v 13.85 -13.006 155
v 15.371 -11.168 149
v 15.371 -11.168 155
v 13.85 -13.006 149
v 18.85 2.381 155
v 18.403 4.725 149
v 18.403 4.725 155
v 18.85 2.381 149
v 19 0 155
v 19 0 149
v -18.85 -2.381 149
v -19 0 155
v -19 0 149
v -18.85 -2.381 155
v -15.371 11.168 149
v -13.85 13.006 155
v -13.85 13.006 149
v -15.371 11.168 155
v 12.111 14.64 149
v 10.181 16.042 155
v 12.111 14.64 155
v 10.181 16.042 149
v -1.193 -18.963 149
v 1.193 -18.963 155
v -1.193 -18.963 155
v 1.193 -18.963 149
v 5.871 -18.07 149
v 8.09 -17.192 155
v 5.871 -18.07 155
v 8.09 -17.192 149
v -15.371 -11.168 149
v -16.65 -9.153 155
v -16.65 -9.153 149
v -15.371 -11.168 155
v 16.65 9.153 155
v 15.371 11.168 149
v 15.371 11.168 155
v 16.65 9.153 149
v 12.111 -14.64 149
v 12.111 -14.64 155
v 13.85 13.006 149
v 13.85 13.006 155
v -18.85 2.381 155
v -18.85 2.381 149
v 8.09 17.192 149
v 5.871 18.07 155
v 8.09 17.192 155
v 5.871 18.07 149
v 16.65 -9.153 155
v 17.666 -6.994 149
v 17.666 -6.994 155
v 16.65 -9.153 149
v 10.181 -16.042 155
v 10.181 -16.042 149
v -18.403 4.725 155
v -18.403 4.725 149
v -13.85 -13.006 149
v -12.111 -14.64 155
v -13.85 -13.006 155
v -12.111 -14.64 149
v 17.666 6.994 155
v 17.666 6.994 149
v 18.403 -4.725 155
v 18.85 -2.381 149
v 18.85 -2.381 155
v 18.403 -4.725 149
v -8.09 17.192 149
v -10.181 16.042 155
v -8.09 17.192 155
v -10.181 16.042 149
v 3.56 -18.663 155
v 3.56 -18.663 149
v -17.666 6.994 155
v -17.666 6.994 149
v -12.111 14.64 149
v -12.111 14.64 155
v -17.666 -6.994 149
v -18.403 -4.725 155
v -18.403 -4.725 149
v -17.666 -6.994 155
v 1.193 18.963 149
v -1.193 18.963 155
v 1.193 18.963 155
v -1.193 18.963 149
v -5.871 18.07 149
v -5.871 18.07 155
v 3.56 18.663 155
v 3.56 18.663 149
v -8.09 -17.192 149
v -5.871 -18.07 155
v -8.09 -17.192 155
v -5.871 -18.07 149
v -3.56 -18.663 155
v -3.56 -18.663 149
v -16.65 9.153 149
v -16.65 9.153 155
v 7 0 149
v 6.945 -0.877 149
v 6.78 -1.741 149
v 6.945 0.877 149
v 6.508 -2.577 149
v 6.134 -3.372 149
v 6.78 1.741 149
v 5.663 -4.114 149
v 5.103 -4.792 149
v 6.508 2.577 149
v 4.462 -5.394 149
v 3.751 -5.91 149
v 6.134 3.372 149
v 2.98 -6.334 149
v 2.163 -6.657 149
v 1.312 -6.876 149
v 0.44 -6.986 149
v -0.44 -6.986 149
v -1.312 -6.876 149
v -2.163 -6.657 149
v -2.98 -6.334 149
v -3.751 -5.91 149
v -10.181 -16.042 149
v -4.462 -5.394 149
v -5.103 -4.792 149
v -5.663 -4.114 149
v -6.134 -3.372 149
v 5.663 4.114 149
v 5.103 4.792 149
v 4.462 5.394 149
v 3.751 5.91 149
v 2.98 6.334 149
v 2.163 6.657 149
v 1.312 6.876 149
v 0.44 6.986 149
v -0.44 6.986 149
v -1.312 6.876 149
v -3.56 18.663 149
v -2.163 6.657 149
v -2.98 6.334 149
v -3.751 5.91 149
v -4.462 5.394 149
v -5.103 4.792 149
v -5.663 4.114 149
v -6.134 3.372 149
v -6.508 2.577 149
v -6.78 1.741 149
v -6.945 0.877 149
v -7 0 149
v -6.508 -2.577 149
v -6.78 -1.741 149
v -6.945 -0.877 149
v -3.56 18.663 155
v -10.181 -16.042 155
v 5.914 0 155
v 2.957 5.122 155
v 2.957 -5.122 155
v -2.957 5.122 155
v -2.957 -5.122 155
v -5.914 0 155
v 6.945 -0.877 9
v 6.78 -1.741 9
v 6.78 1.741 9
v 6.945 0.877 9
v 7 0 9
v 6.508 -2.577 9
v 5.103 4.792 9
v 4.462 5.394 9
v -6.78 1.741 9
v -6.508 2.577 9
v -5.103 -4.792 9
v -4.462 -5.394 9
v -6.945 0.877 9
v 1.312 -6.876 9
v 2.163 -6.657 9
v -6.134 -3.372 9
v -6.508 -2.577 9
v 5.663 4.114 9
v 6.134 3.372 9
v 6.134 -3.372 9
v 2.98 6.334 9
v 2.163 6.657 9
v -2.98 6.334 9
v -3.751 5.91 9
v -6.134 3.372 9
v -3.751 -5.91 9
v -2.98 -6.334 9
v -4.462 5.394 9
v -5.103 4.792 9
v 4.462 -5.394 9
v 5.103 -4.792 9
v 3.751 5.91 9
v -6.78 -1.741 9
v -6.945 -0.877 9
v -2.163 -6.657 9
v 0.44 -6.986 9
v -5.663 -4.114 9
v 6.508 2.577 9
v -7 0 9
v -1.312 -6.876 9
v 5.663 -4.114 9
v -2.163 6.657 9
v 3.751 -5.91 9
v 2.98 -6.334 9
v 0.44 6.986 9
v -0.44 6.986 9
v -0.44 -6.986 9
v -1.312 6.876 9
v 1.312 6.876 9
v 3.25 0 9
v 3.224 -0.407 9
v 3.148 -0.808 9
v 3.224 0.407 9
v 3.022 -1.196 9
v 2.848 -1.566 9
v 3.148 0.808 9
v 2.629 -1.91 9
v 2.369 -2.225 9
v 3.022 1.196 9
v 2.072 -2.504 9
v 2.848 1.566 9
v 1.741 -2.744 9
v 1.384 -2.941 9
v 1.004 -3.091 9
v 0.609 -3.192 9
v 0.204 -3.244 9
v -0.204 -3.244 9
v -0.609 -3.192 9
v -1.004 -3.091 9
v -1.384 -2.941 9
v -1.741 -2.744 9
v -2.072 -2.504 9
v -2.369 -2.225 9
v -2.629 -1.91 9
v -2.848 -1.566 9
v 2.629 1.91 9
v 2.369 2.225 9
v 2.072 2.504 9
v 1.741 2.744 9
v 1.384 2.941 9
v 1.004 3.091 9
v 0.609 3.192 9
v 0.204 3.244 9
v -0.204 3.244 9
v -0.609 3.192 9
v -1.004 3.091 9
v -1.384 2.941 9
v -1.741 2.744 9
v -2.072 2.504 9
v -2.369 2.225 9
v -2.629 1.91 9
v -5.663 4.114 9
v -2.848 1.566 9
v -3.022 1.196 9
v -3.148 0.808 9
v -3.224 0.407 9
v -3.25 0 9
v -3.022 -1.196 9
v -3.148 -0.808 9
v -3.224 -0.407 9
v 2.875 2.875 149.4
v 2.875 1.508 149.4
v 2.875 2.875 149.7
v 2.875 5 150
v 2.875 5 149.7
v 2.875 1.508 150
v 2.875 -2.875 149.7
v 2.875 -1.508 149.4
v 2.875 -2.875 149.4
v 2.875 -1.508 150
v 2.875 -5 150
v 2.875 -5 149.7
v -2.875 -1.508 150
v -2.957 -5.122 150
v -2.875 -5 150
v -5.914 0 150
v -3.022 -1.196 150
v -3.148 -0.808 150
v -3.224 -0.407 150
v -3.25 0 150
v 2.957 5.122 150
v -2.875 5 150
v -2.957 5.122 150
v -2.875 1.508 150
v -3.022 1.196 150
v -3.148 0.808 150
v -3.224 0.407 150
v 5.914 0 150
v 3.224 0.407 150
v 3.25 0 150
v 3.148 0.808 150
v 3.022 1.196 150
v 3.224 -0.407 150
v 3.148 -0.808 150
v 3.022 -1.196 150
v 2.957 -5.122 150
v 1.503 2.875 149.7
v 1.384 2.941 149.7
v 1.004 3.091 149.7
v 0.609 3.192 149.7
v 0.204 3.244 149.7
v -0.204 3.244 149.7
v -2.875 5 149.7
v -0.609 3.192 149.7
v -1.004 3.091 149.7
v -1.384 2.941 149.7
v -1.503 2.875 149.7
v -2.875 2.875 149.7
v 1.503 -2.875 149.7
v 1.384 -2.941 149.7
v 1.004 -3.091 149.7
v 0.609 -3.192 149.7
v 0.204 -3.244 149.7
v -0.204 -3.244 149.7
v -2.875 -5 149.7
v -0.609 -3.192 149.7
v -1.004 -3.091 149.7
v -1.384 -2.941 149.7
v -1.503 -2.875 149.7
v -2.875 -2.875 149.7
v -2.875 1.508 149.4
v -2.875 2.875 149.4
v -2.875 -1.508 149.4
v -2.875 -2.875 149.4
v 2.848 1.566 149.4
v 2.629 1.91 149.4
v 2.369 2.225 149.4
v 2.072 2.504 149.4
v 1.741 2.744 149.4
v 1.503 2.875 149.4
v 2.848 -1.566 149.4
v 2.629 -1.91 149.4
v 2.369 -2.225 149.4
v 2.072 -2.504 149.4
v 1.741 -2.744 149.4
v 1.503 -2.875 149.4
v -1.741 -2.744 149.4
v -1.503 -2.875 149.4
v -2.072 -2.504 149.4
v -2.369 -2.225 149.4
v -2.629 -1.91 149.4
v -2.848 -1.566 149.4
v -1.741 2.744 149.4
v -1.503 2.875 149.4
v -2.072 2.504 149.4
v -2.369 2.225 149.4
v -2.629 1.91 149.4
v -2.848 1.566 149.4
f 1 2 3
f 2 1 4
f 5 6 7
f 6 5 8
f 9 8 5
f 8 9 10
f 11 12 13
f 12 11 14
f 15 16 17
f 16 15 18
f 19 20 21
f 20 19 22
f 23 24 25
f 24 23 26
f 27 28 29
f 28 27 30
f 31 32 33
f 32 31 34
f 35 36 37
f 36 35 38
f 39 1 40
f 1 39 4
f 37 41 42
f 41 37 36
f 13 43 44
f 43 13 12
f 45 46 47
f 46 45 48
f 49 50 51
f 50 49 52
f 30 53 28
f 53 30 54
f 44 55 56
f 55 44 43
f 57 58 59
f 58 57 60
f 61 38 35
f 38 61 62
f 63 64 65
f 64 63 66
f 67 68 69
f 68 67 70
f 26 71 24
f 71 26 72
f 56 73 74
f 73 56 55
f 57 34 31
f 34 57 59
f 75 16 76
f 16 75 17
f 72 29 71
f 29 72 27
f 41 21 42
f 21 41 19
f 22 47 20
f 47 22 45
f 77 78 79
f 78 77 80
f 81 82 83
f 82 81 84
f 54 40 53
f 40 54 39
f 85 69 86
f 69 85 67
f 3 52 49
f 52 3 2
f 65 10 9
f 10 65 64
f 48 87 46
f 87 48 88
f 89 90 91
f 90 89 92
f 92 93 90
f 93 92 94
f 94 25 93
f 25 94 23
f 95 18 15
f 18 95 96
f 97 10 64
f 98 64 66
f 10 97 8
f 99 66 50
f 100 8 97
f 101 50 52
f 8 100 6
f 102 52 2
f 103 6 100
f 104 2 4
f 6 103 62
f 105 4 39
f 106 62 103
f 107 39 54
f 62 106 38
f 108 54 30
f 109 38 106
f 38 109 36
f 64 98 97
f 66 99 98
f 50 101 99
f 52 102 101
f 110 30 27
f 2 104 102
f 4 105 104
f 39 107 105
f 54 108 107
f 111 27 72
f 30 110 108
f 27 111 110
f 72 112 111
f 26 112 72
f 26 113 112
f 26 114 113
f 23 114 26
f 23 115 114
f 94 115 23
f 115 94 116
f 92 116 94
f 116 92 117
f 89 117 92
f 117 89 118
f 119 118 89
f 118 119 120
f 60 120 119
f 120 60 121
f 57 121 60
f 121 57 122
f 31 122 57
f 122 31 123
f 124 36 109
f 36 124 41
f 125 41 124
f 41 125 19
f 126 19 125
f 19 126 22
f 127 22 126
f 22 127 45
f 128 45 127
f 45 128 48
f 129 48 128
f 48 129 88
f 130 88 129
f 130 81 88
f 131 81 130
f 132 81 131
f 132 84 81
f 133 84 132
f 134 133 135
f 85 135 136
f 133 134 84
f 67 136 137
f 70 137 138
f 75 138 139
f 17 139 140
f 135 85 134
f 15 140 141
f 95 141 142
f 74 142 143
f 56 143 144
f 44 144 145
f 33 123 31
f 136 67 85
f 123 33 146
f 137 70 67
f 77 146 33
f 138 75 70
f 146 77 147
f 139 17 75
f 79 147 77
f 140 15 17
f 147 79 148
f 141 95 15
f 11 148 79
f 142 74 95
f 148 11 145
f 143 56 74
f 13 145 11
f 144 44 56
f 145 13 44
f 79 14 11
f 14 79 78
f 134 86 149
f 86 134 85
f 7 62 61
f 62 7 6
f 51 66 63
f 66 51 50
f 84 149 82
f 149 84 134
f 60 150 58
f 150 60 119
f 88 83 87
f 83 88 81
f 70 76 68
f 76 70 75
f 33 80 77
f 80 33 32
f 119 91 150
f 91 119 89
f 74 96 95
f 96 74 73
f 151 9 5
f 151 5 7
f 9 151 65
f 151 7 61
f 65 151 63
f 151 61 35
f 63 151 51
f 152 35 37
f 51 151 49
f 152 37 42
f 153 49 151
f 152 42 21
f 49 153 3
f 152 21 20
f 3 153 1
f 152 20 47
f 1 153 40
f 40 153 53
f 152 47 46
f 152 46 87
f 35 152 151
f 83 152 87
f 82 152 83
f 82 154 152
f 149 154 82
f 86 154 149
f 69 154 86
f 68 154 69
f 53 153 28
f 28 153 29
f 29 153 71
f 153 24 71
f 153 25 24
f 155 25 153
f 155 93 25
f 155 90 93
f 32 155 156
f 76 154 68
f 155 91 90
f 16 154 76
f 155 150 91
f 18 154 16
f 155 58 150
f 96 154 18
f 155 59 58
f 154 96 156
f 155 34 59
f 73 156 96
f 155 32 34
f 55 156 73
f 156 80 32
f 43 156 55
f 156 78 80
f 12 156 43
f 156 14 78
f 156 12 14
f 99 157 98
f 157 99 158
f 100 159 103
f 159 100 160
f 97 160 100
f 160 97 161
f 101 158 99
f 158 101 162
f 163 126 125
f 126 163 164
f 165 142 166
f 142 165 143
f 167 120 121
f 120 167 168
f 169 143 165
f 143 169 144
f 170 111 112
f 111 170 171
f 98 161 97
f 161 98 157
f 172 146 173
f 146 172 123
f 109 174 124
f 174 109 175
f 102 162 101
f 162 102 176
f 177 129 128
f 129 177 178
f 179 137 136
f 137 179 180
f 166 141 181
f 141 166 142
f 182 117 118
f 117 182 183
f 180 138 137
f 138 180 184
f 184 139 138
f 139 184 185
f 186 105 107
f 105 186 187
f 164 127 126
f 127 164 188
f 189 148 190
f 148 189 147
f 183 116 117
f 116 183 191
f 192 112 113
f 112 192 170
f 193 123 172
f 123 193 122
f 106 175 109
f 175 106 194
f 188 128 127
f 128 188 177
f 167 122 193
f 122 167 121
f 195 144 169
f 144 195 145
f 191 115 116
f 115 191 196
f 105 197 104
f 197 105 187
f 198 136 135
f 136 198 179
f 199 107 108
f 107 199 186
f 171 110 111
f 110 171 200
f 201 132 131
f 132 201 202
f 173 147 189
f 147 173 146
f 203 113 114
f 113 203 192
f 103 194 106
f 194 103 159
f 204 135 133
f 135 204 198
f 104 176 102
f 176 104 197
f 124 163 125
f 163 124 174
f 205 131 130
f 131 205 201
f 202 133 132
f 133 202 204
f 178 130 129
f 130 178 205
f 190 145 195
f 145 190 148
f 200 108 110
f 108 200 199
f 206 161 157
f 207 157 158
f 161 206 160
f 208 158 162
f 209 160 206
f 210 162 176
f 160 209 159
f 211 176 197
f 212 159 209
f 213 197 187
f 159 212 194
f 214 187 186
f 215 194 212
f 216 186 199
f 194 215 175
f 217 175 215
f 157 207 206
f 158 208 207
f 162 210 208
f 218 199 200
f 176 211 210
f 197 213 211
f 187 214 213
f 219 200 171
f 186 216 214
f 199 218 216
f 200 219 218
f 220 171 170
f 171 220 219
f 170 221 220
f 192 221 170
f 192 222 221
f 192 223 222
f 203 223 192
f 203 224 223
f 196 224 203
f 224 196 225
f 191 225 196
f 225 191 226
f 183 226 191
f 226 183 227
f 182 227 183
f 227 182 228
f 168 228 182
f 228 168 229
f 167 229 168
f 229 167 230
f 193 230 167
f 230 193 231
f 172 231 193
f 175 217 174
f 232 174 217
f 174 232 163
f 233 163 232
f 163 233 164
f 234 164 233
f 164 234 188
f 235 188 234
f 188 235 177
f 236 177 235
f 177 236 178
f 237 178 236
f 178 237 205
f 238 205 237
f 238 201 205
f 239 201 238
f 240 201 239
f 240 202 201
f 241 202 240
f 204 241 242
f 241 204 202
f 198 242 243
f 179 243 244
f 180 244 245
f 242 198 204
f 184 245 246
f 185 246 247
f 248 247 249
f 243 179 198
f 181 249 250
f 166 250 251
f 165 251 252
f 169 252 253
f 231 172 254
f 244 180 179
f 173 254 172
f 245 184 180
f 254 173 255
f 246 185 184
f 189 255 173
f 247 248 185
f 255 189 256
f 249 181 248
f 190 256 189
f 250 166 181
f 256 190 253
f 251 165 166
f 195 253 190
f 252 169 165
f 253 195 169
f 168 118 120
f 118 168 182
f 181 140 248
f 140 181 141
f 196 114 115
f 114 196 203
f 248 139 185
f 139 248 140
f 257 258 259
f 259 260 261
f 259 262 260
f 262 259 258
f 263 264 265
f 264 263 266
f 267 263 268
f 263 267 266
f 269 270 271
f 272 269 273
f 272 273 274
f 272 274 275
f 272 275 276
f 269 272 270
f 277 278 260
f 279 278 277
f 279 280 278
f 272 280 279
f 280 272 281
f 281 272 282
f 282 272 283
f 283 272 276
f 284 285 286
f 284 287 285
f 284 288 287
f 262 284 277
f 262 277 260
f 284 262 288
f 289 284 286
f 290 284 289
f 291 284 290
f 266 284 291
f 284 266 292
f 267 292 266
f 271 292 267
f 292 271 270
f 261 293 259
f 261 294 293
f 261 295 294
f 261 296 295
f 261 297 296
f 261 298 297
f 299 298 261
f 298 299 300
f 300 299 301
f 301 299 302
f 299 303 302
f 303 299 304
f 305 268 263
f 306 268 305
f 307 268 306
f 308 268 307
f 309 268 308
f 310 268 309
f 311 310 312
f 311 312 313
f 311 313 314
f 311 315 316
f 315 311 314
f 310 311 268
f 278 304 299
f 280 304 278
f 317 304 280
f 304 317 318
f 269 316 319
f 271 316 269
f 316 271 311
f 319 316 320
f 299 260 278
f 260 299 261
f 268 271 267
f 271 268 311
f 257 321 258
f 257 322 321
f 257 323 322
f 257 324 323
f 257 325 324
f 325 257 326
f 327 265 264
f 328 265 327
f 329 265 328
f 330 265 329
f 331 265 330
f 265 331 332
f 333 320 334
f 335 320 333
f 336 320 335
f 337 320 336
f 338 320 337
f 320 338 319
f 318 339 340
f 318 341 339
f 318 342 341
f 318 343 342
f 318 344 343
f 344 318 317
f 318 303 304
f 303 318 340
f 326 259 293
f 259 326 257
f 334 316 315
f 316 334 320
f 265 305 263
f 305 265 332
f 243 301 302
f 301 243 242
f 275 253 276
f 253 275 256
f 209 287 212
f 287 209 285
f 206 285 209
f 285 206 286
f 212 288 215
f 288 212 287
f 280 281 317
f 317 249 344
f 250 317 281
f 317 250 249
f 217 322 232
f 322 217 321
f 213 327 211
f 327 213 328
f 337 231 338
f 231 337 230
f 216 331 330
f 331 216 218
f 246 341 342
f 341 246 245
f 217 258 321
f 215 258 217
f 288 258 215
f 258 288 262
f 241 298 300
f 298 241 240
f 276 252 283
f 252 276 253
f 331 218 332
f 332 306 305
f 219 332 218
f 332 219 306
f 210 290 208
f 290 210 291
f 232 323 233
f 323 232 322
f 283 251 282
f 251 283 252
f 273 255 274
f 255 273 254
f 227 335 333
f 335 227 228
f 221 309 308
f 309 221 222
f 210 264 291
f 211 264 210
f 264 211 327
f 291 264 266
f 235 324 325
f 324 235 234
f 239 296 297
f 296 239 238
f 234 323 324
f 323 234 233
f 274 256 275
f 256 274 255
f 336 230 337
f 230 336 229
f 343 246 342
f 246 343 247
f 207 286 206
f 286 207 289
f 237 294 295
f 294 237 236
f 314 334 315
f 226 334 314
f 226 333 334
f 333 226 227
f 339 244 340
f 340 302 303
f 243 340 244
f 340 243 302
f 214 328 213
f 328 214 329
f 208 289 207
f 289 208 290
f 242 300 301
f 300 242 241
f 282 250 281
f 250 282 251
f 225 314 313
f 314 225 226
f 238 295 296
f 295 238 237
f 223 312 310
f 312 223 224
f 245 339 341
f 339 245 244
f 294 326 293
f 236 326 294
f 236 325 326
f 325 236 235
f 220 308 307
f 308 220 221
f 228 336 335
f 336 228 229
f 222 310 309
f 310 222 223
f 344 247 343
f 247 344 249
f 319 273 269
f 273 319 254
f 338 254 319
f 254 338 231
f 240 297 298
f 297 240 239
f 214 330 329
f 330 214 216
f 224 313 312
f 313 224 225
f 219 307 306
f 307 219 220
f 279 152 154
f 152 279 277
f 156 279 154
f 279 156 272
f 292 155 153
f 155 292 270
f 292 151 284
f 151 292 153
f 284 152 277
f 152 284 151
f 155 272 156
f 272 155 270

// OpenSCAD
$fn = 50;


difference() {
	union() {
		translate(v = [0, 0, 149.0000000000]) {
			cylinder(h = 6, r = 19.0000000000);
		}
		translate(v = [0, 0, 9.0000000000]) {
			cylinder(h = 146, r = 7.0000000000);
		}
	}
	union() {
		translate(v = [0, 0, 155]) {
			rotate(a = [0, 0, 0]) {
				difference() {
					union() {
						#translate(v = [-2.8750000000, -5.0000000000, -5.3000000000]) {
							cube(size = [5.7500000000, 10, 0.3000000000]);
						}
						#translate(v = [-2.8750000000, -2.8750000000, -5.6000000000]) {
							cube(size = [5.7500000000, 5.7500000000, 0.3000000000]);
						}
						#translate(v = [-2.8750000000, -5.0000000000, 0]) {
							cube(size = [5.7500000000, 10, 0.3000000000]);
						}
						#translate(v = [-2.8750000000, -2.8750000000, 0.3000000000]) {
							cube(size = [5.7500000000, 5.7500000000, 0.3000000000]);
						}
						#translate(v = [0, 0, -100.0000000000]) {
							cylinder(h = 200, r = 3.2500000000);
						}
						translate(v = [0, 0, -5]) {
							#linear_extrude(height = 5) {
								polygon(points = [[5.9142500000, 0.0000000000], [2.9571250000, 5.1218907443], [-2.9571250000, 5.1218907443], [-5.9142500000, 0.0000000000], [-2.9571250000, -5.1218907443], [2.9571250000, -5.1218907443]]);
							}
						}
						#translate(v = [-2.8750000000, -5.0000000000, -5.3000000000]) {
							cube(size = [5.7500000000, 10, 0.3000000000]);
						}
						#translate(v = [-2.8750000000, -2.8750000000, -5.6000000000]) {
							cube(size = [5.7500000000, 5.7500000000, 0.3000000000]);
						}
						#translate(v = [-2.8750000000, -5.0000000000, 0]) {
							cube(size = [5.7500000000, 10, 0.3000000000]);
						}
						#translate(v = [-2.8750000000, -2.8750000000, 0.3000000000]) {
							cube(size = [5.7500000000, 5.7500000000, 0.3000000000]);
						}
						#translate(v = [0, 0, -100.0000000000]) {
							cylinder(h = 200, r = 3.2500000000);
						}
						#translate(v = [-2.8750000000, -5.0000000000, -5.3000000000]) {
							cube(size = [5.7500000000, 10, 0.3000000000]);
						}
						#translate(v = [-2.8750000000, -2.8750000000, -5.6000000000]) {
							cube(size = [5.7500000000, 5.7500000000, 0.3000000000]);
						}
						#translate(v = [-2.8750000000, -5.0000000000, 0]) {
							cube(size = [5.7500000000, 10, 0.3000000000]);
						}
						#translate(v = [-2.8750000000, -2.8750000000, 0.3000000000]) {
							cube(size = [5.7500000000, 5.7500000000, 0.3000000000]);
						}
						#translate(v = [0, 0, -100.0000000000]) {
							cylinder(h = 200, r = 3.2500000000);
						}
					}
					union();
				}
			}
		}
		#translate(v = [0, 0, -100.0000000000]) {
			cylinder(h = 200, r = 3.2500000000);
		}
	}
}
